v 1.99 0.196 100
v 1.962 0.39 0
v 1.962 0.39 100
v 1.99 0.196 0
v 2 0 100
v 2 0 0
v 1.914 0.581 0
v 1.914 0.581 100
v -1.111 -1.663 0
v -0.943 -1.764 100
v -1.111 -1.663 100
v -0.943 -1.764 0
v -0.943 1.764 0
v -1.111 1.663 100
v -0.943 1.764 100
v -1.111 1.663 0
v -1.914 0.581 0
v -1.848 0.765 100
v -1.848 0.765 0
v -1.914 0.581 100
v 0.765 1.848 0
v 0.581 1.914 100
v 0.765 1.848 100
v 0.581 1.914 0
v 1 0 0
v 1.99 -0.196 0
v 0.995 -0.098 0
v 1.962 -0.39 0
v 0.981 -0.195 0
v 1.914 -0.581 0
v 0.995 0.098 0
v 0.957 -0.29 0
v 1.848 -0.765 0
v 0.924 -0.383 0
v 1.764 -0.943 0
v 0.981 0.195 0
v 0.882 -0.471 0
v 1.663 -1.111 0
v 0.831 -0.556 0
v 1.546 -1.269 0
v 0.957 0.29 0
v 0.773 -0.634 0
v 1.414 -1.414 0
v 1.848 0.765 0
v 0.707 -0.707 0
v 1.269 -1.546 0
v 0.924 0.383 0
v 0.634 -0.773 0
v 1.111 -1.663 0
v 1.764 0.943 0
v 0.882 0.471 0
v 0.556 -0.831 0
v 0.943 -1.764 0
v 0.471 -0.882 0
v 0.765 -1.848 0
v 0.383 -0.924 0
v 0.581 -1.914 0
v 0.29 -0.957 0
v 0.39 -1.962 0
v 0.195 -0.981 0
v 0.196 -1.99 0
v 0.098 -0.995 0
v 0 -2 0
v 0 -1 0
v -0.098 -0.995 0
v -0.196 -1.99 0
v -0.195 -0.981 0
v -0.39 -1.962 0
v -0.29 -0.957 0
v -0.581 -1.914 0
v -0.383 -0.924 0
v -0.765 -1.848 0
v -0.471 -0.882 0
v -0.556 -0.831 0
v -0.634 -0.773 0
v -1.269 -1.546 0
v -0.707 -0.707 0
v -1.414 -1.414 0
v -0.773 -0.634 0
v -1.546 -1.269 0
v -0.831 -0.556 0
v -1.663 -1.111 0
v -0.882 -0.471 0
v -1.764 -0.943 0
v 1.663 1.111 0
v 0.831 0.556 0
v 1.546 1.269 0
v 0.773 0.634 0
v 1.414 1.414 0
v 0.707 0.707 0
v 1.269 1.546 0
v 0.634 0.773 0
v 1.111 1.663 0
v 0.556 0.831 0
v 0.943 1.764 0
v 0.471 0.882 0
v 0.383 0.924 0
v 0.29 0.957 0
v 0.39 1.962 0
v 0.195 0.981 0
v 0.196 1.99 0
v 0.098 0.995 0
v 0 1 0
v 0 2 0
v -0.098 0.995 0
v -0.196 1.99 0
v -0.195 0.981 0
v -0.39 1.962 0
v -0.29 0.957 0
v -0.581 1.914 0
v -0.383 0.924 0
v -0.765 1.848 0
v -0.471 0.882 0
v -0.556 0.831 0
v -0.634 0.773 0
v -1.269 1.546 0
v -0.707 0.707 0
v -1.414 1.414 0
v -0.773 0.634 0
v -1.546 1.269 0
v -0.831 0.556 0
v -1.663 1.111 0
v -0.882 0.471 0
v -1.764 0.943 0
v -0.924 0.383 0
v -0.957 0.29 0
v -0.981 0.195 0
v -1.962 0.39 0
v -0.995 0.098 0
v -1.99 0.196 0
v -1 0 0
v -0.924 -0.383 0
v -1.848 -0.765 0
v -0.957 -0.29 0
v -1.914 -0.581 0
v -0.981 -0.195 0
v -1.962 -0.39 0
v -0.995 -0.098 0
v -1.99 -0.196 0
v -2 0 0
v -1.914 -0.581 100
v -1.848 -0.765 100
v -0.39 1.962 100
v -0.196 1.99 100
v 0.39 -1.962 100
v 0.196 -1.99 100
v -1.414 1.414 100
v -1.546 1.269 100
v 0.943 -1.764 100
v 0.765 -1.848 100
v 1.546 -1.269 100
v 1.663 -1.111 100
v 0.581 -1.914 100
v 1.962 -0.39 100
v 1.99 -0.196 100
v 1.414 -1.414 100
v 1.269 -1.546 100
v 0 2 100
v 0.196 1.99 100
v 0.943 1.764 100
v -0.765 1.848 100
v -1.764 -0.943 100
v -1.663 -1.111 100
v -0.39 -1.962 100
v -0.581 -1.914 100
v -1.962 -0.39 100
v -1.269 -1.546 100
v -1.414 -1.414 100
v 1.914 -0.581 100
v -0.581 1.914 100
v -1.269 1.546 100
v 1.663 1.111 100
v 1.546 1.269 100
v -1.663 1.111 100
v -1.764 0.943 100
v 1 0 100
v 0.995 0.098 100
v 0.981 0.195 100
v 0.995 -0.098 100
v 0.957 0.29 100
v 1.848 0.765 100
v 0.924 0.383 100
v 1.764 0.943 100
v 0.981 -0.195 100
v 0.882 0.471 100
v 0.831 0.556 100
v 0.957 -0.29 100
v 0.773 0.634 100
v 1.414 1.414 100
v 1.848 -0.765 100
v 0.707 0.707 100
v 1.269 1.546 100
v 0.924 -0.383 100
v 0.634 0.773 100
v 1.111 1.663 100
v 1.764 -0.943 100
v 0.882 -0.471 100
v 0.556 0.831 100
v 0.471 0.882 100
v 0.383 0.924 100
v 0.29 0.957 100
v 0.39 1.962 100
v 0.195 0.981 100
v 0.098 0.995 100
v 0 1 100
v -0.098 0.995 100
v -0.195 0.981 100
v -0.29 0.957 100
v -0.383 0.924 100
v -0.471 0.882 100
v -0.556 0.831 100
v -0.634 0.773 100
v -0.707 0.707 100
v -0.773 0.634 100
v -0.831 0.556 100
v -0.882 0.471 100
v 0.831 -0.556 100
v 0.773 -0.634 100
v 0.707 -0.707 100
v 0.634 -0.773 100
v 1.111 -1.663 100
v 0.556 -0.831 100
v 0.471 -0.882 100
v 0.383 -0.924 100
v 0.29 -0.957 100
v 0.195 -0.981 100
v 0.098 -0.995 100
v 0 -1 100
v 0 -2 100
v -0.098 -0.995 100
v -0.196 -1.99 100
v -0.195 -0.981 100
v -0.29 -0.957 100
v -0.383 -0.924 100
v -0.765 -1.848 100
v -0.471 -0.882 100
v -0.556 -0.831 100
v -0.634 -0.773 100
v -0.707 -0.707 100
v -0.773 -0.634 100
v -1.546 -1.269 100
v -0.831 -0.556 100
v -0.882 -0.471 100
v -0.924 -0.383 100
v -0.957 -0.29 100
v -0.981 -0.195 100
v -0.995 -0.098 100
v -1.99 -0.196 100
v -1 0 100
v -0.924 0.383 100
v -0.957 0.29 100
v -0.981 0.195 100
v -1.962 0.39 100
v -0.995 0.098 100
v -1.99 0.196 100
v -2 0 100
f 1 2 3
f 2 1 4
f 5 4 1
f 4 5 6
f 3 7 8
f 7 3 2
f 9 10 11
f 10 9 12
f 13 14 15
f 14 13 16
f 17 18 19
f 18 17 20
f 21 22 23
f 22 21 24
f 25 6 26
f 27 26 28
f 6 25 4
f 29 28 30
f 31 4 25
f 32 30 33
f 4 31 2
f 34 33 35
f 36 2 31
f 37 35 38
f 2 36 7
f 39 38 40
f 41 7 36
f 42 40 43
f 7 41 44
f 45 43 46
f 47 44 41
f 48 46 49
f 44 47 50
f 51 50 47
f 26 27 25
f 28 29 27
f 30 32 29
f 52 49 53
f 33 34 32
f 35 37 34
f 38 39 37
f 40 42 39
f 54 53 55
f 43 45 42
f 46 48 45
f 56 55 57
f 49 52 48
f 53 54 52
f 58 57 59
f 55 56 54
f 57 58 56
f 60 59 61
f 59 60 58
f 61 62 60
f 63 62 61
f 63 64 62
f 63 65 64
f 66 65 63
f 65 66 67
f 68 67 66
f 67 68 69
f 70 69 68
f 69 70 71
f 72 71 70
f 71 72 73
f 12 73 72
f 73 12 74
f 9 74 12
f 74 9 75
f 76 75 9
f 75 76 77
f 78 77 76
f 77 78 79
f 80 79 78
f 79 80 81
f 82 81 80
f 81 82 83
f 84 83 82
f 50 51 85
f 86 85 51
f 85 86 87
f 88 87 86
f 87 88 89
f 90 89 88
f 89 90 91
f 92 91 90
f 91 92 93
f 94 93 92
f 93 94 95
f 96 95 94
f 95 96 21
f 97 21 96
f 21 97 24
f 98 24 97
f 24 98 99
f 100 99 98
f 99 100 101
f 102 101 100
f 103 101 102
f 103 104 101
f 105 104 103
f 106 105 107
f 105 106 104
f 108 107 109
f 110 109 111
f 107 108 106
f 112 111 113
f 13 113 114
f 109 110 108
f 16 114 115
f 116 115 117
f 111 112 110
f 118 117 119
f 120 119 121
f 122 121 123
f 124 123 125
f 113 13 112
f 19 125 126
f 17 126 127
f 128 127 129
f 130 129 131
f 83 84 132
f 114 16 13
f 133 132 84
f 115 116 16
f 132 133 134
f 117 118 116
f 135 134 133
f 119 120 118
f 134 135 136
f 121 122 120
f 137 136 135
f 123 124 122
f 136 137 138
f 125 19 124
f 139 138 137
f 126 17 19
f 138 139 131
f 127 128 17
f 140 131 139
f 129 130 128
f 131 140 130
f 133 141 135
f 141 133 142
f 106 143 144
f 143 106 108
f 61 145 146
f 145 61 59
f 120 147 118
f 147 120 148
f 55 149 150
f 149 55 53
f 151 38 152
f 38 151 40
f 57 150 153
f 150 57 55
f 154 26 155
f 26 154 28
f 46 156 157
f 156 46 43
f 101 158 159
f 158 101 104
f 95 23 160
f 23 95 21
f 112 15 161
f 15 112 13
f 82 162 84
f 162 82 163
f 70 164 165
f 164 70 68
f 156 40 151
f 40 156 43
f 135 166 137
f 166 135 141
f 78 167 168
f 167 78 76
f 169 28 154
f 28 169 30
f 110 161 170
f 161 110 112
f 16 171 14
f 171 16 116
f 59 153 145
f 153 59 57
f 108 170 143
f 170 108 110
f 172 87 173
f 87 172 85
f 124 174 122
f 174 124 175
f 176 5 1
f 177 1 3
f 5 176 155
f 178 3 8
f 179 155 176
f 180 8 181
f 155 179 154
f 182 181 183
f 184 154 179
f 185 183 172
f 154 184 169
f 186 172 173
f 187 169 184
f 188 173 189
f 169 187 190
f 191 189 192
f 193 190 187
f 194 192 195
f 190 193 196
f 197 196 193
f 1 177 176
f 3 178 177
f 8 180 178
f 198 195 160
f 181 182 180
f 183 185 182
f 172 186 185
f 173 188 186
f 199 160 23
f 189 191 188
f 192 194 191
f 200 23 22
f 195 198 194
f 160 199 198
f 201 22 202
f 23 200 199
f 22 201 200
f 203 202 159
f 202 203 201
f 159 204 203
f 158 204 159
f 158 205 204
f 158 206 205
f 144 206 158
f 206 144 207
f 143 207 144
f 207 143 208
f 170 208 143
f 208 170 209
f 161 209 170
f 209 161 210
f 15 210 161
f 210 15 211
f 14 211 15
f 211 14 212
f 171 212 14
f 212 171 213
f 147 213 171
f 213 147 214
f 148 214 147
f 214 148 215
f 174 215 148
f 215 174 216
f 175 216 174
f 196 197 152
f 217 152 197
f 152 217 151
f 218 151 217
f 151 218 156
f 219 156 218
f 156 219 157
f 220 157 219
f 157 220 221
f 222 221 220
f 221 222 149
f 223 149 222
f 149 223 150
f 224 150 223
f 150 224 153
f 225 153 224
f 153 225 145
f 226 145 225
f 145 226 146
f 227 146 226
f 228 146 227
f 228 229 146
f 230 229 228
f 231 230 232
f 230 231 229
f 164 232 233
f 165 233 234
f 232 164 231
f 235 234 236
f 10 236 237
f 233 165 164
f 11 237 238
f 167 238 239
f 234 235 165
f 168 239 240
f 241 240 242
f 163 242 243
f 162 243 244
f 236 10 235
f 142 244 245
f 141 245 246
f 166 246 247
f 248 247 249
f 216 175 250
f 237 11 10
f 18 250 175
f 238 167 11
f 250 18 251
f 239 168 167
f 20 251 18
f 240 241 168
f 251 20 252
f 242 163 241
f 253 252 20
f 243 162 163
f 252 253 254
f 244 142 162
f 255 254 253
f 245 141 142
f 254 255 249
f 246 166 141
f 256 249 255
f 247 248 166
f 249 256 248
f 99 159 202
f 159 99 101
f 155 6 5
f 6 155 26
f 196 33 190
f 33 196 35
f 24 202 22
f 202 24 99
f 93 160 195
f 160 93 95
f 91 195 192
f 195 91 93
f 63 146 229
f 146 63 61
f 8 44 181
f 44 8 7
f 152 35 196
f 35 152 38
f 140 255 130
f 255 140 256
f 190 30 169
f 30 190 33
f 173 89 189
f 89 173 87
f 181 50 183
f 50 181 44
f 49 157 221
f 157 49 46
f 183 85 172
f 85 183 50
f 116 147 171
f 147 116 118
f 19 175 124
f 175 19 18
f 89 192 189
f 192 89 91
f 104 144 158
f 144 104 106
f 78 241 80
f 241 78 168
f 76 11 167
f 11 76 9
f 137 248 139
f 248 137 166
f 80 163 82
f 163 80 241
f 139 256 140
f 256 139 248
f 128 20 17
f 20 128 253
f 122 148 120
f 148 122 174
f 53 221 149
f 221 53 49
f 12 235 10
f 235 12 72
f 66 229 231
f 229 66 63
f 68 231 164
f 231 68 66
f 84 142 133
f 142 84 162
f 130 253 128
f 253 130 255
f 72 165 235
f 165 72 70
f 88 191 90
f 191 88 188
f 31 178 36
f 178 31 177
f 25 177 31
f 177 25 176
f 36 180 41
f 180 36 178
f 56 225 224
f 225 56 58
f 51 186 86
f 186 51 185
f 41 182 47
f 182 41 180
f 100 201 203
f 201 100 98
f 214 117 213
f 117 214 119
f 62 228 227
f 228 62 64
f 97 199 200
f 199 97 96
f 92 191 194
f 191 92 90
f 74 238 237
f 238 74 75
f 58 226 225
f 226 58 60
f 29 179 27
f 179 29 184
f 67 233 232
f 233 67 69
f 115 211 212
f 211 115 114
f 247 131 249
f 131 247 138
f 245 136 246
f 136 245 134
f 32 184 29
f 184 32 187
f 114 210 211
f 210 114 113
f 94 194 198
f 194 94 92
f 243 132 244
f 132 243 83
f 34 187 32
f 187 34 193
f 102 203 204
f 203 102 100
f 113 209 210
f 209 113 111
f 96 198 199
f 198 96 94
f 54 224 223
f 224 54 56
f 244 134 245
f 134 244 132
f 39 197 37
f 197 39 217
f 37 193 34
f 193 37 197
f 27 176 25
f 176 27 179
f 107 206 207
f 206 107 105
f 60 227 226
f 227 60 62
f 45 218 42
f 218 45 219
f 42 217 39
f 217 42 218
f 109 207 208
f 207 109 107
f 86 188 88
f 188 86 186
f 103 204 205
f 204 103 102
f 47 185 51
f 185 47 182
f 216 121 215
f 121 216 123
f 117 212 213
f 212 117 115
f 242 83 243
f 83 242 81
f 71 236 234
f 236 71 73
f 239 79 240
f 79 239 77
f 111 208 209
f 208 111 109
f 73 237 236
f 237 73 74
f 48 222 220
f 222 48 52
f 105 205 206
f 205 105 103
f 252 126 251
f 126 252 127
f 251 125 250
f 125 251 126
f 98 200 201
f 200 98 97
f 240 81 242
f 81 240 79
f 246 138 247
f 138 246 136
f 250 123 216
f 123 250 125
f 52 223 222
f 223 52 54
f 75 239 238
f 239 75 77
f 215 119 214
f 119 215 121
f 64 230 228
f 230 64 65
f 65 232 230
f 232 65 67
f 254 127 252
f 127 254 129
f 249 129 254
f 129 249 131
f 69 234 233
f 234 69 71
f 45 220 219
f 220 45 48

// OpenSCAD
module ptfe_tubing(outer_diameter=4, inner_diameter=2, length=100) {
    difference() {
        cylinder(d=outer_diameter, h=length, $fn=64);
        translate([0, 0, -1])
            cylinder(d=inner_diameter, h=length + 2, $fn=64);
    }
}

ptfe_tubing();
